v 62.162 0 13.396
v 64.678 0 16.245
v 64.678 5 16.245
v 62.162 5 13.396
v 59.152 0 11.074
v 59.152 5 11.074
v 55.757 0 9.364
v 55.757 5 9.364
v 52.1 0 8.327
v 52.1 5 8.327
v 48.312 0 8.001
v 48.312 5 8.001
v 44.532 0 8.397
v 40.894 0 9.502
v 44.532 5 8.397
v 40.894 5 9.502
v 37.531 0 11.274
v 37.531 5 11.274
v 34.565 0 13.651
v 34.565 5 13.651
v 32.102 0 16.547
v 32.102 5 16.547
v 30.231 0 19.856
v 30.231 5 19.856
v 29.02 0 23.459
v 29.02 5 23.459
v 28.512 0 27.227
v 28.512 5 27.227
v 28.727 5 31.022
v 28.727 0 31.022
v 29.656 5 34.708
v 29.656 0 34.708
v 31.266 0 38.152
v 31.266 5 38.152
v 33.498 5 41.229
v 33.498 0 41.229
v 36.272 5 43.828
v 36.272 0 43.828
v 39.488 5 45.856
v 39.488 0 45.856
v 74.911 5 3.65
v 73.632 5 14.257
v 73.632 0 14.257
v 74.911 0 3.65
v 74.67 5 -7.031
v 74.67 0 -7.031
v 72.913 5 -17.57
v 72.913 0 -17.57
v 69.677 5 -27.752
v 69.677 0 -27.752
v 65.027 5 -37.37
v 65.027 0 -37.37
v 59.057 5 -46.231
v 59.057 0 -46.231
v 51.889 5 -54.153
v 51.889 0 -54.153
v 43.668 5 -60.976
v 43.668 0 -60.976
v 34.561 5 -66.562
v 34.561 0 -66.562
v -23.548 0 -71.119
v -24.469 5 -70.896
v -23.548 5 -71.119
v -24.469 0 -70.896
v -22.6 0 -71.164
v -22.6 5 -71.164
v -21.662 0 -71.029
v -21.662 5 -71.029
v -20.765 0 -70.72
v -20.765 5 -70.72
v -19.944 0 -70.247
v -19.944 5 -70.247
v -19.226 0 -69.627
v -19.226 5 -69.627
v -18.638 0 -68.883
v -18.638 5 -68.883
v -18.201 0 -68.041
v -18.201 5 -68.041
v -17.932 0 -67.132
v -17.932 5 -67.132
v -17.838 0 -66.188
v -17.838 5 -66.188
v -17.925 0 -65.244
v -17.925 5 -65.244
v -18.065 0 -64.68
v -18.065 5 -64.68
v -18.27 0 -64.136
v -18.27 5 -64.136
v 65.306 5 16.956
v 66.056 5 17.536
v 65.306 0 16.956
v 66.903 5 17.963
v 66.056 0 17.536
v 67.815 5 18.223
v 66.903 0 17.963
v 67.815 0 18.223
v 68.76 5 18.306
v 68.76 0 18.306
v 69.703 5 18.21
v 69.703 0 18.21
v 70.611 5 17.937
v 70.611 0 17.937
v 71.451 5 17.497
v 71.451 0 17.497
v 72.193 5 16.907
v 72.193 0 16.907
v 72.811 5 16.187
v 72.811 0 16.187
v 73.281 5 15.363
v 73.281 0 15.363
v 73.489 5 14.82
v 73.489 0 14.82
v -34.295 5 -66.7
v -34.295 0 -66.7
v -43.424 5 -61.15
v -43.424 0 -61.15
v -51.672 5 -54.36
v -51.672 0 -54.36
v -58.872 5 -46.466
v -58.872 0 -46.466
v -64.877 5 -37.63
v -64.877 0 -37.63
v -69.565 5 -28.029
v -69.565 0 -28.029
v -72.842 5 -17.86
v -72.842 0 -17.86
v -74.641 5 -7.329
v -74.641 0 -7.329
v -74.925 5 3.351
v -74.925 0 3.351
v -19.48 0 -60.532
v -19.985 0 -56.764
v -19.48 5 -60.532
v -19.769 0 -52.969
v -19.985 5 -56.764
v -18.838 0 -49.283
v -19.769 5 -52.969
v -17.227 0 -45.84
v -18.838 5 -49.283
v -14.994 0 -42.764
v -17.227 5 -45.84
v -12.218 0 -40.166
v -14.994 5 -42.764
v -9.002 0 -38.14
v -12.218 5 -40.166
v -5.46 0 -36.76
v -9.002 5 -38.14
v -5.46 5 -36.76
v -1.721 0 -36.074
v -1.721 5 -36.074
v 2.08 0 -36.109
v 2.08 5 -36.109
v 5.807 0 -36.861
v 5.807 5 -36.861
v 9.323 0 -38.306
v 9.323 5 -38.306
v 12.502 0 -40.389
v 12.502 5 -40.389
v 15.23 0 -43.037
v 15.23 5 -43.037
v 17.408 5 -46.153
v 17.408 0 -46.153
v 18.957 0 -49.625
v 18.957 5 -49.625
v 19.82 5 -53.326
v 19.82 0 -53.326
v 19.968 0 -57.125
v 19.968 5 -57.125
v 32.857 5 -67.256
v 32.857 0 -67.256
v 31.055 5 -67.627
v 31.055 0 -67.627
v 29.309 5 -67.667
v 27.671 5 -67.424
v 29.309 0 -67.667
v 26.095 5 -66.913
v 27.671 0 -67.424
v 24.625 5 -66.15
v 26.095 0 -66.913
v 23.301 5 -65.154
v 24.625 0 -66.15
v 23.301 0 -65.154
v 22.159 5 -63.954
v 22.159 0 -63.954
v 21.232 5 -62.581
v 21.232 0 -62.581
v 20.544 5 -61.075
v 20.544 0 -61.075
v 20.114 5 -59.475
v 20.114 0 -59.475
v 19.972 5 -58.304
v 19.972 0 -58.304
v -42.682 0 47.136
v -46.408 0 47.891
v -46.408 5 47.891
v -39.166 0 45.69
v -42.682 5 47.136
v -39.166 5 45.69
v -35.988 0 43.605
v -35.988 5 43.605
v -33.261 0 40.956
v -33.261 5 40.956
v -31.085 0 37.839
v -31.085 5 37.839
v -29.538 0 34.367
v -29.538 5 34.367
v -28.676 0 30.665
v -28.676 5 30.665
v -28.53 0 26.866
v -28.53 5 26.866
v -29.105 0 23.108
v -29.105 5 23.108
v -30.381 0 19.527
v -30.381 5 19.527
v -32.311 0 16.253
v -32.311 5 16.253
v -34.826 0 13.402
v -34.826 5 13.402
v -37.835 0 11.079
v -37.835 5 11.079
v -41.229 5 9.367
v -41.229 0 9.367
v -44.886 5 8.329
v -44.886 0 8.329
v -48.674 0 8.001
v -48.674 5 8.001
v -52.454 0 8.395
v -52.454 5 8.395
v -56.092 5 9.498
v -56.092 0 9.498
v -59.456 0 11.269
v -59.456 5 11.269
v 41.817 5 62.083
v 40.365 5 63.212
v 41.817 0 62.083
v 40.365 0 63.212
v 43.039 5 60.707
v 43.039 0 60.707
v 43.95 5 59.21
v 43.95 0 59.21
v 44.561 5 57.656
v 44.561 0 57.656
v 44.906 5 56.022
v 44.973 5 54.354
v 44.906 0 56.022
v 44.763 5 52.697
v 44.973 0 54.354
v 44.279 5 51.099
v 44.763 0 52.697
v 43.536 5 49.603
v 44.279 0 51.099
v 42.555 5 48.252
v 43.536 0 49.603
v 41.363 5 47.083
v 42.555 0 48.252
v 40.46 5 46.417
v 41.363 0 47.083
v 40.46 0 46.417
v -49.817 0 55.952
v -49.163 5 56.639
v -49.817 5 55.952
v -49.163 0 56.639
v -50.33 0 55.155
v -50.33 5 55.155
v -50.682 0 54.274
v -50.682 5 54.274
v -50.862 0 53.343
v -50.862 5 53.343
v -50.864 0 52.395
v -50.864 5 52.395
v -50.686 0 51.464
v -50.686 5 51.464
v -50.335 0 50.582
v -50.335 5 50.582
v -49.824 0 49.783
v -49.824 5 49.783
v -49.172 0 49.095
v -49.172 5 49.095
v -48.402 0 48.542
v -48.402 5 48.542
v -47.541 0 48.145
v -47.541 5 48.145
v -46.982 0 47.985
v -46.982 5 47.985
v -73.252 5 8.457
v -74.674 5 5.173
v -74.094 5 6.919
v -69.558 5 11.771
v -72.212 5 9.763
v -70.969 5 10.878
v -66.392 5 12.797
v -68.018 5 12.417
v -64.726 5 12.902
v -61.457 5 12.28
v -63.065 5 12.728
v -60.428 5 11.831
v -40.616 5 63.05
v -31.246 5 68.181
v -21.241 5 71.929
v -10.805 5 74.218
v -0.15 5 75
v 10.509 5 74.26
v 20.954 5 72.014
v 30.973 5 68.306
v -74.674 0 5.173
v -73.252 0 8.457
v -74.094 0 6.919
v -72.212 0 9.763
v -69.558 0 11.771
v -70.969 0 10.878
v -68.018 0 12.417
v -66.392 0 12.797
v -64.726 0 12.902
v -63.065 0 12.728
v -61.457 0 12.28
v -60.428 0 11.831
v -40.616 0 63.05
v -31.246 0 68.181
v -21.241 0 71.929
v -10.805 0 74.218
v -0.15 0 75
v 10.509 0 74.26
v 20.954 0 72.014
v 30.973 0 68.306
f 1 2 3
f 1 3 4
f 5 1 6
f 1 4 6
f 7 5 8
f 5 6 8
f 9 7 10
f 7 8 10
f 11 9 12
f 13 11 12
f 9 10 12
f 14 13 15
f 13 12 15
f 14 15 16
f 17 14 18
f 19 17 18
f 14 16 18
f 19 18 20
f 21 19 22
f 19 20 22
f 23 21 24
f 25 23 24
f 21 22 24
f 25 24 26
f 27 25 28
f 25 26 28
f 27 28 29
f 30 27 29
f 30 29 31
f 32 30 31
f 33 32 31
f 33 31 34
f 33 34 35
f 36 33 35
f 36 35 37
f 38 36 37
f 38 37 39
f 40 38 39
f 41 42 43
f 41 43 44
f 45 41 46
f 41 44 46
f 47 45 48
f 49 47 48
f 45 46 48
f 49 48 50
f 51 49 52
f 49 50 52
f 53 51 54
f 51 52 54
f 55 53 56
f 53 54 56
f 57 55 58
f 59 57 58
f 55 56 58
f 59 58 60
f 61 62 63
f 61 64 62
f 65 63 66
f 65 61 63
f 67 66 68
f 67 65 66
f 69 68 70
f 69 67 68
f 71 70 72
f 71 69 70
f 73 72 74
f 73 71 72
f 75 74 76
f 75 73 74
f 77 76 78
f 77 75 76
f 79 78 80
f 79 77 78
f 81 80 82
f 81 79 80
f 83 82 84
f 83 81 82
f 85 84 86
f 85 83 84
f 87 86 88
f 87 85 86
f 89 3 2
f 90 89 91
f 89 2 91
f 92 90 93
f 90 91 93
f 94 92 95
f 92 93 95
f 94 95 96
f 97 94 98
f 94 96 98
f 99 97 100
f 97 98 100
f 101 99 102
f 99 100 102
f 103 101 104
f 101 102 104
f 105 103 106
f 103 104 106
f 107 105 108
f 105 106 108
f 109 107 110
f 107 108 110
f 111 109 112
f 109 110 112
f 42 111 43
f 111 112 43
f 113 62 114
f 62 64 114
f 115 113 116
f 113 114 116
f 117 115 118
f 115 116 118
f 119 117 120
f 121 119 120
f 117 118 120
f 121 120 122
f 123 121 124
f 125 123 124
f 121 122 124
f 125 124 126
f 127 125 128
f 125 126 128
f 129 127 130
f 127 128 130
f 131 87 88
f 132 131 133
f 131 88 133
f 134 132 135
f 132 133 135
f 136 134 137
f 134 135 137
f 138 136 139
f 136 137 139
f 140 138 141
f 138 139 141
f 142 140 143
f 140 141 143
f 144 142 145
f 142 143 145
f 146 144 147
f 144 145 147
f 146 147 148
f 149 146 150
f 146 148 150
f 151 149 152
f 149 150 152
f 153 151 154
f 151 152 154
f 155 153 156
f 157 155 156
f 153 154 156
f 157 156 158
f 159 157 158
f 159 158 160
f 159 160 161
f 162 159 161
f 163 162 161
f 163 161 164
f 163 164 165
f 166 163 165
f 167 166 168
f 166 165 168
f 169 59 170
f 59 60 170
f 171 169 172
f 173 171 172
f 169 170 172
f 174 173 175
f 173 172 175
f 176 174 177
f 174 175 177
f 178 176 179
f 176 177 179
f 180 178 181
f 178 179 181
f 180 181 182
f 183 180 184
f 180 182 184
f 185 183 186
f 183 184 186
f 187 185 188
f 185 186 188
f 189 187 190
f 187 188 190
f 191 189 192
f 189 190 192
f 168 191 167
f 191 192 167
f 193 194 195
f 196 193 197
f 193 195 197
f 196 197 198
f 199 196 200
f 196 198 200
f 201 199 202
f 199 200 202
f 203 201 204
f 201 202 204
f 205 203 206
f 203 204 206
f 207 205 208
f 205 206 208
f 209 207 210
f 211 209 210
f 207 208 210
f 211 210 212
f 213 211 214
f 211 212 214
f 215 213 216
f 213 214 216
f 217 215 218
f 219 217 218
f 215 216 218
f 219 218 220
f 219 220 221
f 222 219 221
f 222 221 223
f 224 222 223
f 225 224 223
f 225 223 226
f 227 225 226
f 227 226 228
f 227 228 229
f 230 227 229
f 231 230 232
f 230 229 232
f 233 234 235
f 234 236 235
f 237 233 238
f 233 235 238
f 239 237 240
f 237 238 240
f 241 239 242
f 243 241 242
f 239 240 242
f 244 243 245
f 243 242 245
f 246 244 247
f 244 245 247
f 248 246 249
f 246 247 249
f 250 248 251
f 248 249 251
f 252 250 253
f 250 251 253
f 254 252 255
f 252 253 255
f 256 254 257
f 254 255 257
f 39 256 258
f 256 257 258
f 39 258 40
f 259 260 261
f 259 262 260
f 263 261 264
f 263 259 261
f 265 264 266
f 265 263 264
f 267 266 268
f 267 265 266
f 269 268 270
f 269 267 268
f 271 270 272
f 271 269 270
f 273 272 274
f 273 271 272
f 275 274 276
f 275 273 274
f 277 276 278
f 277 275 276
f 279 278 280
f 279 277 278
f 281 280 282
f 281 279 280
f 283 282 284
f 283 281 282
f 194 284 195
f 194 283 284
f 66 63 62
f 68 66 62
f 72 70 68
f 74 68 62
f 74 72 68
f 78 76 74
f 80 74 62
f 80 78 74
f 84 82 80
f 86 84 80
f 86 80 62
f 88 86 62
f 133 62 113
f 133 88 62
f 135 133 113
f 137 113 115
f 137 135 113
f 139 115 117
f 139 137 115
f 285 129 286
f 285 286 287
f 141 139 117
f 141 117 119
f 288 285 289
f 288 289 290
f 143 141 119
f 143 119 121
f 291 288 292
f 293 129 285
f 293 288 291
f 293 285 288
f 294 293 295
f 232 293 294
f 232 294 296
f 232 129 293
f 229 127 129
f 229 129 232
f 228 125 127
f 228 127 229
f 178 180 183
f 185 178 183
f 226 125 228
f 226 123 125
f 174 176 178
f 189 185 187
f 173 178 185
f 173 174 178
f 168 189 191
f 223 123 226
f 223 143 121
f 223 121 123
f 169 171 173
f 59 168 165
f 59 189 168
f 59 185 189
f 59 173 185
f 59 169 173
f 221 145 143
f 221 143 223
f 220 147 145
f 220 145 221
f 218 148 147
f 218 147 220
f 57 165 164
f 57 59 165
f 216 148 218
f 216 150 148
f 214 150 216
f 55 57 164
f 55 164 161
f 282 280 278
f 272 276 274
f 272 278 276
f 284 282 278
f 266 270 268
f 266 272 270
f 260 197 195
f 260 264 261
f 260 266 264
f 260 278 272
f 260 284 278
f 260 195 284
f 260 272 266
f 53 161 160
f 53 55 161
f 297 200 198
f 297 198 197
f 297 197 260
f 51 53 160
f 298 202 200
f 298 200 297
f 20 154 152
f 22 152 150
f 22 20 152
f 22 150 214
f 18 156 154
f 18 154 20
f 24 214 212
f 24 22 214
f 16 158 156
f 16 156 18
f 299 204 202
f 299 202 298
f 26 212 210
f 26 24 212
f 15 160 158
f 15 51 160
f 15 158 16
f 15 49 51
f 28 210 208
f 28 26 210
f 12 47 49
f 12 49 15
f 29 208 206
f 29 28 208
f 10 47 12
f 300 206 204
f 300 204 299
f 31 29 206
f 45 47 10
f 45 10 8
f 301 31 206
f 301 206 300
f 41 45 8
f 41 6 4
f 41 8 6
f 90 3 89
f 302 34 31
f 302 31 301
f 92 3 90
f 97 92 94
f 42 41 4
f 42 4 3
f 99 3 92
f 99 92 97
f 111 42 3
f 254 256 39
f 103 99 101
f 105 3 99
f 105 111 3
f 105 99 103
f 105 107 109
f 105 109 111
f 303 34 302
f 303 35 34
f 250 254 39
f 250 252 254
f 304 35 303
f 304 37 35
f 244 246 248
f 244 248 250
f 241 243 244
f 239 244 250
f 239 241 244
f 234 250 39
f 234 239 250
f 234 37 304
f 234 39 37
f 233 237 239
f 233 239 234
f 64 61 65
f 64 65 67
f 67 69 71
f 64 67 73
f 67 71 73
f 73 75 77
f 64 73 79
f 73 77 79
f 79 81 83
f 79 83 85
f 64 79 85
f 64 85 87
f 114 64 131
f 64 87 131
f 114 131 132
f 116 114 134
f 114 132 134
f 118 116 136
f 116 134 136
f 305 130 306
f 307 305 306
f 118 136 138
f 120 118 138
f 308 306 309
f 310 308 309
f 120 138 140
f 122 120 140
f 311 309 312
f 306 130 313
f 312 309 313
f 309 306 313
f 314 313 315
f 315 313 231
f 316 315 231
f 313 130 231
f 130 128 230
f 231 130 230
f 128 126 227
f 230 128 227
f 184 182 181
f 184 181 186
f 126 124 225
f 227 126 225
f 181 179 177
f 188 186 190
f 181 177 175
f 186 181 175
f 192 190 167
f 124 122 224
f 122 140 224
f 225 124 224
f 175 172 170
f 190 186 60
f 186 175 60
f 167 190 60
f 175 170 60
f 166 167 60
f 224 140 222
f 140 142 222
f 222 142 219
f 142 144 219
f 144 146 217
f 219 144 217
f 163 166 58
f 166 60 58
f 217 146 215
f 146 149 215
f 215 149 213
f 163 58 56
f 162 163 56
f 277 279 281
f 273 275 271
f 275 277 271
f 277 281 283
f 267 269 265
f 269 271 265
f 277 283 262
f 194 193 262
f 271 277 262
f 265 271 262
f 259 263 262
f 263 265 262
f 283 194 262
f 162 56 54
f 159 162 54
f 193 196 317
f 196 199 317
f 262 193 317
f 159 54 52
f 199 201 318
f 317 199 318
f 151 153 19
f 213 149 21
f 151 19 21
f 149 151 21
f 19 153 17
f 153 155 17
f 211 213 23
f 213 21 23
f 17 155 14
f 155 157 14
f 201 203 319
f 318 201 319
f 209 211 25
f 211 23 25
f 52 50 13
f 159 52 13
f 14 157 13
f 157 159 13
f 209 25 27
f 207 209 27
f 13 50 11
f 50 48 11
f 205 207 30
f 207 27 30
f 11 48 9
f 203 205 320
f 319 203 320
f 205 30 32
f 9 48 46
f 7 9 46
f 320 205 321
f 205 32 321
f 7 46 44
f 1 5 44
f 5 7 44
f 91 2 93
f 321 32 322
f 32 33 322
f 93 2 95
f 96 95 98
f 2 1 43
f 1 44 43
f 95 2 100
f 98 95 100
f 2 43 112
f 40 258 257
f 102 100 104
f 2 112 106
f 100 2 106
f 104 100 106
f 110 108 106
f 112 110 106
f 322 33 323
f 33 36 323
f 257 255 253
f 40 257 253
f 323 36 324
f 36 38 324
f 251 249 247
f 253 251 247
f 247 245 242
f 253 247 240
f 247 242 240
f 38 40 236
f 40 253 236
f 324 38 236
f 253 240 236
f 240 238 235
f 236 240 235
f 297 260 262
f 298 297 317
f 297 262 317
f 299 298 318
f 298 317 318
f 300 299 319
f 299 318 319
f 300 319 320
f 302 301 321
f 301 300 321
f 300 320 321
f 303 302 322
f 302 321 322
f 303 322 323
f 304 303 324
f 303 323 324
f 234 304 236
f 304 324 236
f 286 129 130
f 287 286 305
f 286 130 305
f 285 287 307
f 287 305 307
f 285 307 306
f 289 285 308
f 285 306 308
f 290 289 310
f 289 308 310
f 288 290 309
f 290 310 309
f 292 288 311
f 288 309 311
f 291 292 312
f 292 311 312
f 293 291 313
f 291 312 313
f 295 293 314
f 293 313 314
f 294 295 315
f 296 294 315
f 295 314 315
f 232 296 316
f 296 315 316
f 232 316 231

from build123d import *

# Parameters (mm, degrees)
SKETCH2_R           = 75
BOSS_EXTRUDE2_DEPTH = 5
SKETCH3_R           = 20
CUT_EXTRUDE2_DEPTH  = 107.183802908
FILLET2_R           = 10
FILLET3_R           = 5


with BuildPart() as part:
    # Sketch2 → Boss-Extrude2 (new body)
    with BuildSketch(Plane(origin=(0, 0, 0), x_dir=(1, 0, 0), z_dir=(0, 1, 0))):
        with Locations(Location((0, 0, 0), (0, 0, 270))):
            Circle(SKETCH2_R)
    extrude(amount=BOSS_EXTRUDE2_DEPTH)

    # Sketch3 → Cut-Extrude2 (cut, through all)
    with BuildSketch(Plane(origin=(0, 5, 0), x_dir=(1, 0, 0), z_dir=(0, 1, 0))):
        with Locations((0, 56)):
            Circle(SKETCH3_R)
        with Locations((48.497422612, -28)):
            Circle(SKETCH3_R)
        with Locations((-48.497422612, -28)):
            Circle(SKETCH3_R)
    extrude(amount=-CUT_EXTRUDE2_DEPTH, mode=Mode.SUBTRACT)

    # Fillet2
    fillet2_edges = [part.edges().sort_by_distance(p)[0] for p in [
        (7.218787271, 2.5, -74.651785714),
        (61.040949231, 2.5, 43.577546019),
        (-68.259736502, 2.5, 31.074239696),
    ]]
    fillet(fillet2_edges, radius=FILLET2_R)

    # Fillet3
    fillet3_edges = [part.edges().sort_by_distance(p)[0] for p in [
        (-7.218787271, 2.5, -74.651785714),
        (68.259736502, 2.5, 31.074239696),
        (-61.040949231, 2.5, 43.577546019),
    ]]
    fillet(fillet3_edges, radius=FILLET3_R)


solid = part.part
